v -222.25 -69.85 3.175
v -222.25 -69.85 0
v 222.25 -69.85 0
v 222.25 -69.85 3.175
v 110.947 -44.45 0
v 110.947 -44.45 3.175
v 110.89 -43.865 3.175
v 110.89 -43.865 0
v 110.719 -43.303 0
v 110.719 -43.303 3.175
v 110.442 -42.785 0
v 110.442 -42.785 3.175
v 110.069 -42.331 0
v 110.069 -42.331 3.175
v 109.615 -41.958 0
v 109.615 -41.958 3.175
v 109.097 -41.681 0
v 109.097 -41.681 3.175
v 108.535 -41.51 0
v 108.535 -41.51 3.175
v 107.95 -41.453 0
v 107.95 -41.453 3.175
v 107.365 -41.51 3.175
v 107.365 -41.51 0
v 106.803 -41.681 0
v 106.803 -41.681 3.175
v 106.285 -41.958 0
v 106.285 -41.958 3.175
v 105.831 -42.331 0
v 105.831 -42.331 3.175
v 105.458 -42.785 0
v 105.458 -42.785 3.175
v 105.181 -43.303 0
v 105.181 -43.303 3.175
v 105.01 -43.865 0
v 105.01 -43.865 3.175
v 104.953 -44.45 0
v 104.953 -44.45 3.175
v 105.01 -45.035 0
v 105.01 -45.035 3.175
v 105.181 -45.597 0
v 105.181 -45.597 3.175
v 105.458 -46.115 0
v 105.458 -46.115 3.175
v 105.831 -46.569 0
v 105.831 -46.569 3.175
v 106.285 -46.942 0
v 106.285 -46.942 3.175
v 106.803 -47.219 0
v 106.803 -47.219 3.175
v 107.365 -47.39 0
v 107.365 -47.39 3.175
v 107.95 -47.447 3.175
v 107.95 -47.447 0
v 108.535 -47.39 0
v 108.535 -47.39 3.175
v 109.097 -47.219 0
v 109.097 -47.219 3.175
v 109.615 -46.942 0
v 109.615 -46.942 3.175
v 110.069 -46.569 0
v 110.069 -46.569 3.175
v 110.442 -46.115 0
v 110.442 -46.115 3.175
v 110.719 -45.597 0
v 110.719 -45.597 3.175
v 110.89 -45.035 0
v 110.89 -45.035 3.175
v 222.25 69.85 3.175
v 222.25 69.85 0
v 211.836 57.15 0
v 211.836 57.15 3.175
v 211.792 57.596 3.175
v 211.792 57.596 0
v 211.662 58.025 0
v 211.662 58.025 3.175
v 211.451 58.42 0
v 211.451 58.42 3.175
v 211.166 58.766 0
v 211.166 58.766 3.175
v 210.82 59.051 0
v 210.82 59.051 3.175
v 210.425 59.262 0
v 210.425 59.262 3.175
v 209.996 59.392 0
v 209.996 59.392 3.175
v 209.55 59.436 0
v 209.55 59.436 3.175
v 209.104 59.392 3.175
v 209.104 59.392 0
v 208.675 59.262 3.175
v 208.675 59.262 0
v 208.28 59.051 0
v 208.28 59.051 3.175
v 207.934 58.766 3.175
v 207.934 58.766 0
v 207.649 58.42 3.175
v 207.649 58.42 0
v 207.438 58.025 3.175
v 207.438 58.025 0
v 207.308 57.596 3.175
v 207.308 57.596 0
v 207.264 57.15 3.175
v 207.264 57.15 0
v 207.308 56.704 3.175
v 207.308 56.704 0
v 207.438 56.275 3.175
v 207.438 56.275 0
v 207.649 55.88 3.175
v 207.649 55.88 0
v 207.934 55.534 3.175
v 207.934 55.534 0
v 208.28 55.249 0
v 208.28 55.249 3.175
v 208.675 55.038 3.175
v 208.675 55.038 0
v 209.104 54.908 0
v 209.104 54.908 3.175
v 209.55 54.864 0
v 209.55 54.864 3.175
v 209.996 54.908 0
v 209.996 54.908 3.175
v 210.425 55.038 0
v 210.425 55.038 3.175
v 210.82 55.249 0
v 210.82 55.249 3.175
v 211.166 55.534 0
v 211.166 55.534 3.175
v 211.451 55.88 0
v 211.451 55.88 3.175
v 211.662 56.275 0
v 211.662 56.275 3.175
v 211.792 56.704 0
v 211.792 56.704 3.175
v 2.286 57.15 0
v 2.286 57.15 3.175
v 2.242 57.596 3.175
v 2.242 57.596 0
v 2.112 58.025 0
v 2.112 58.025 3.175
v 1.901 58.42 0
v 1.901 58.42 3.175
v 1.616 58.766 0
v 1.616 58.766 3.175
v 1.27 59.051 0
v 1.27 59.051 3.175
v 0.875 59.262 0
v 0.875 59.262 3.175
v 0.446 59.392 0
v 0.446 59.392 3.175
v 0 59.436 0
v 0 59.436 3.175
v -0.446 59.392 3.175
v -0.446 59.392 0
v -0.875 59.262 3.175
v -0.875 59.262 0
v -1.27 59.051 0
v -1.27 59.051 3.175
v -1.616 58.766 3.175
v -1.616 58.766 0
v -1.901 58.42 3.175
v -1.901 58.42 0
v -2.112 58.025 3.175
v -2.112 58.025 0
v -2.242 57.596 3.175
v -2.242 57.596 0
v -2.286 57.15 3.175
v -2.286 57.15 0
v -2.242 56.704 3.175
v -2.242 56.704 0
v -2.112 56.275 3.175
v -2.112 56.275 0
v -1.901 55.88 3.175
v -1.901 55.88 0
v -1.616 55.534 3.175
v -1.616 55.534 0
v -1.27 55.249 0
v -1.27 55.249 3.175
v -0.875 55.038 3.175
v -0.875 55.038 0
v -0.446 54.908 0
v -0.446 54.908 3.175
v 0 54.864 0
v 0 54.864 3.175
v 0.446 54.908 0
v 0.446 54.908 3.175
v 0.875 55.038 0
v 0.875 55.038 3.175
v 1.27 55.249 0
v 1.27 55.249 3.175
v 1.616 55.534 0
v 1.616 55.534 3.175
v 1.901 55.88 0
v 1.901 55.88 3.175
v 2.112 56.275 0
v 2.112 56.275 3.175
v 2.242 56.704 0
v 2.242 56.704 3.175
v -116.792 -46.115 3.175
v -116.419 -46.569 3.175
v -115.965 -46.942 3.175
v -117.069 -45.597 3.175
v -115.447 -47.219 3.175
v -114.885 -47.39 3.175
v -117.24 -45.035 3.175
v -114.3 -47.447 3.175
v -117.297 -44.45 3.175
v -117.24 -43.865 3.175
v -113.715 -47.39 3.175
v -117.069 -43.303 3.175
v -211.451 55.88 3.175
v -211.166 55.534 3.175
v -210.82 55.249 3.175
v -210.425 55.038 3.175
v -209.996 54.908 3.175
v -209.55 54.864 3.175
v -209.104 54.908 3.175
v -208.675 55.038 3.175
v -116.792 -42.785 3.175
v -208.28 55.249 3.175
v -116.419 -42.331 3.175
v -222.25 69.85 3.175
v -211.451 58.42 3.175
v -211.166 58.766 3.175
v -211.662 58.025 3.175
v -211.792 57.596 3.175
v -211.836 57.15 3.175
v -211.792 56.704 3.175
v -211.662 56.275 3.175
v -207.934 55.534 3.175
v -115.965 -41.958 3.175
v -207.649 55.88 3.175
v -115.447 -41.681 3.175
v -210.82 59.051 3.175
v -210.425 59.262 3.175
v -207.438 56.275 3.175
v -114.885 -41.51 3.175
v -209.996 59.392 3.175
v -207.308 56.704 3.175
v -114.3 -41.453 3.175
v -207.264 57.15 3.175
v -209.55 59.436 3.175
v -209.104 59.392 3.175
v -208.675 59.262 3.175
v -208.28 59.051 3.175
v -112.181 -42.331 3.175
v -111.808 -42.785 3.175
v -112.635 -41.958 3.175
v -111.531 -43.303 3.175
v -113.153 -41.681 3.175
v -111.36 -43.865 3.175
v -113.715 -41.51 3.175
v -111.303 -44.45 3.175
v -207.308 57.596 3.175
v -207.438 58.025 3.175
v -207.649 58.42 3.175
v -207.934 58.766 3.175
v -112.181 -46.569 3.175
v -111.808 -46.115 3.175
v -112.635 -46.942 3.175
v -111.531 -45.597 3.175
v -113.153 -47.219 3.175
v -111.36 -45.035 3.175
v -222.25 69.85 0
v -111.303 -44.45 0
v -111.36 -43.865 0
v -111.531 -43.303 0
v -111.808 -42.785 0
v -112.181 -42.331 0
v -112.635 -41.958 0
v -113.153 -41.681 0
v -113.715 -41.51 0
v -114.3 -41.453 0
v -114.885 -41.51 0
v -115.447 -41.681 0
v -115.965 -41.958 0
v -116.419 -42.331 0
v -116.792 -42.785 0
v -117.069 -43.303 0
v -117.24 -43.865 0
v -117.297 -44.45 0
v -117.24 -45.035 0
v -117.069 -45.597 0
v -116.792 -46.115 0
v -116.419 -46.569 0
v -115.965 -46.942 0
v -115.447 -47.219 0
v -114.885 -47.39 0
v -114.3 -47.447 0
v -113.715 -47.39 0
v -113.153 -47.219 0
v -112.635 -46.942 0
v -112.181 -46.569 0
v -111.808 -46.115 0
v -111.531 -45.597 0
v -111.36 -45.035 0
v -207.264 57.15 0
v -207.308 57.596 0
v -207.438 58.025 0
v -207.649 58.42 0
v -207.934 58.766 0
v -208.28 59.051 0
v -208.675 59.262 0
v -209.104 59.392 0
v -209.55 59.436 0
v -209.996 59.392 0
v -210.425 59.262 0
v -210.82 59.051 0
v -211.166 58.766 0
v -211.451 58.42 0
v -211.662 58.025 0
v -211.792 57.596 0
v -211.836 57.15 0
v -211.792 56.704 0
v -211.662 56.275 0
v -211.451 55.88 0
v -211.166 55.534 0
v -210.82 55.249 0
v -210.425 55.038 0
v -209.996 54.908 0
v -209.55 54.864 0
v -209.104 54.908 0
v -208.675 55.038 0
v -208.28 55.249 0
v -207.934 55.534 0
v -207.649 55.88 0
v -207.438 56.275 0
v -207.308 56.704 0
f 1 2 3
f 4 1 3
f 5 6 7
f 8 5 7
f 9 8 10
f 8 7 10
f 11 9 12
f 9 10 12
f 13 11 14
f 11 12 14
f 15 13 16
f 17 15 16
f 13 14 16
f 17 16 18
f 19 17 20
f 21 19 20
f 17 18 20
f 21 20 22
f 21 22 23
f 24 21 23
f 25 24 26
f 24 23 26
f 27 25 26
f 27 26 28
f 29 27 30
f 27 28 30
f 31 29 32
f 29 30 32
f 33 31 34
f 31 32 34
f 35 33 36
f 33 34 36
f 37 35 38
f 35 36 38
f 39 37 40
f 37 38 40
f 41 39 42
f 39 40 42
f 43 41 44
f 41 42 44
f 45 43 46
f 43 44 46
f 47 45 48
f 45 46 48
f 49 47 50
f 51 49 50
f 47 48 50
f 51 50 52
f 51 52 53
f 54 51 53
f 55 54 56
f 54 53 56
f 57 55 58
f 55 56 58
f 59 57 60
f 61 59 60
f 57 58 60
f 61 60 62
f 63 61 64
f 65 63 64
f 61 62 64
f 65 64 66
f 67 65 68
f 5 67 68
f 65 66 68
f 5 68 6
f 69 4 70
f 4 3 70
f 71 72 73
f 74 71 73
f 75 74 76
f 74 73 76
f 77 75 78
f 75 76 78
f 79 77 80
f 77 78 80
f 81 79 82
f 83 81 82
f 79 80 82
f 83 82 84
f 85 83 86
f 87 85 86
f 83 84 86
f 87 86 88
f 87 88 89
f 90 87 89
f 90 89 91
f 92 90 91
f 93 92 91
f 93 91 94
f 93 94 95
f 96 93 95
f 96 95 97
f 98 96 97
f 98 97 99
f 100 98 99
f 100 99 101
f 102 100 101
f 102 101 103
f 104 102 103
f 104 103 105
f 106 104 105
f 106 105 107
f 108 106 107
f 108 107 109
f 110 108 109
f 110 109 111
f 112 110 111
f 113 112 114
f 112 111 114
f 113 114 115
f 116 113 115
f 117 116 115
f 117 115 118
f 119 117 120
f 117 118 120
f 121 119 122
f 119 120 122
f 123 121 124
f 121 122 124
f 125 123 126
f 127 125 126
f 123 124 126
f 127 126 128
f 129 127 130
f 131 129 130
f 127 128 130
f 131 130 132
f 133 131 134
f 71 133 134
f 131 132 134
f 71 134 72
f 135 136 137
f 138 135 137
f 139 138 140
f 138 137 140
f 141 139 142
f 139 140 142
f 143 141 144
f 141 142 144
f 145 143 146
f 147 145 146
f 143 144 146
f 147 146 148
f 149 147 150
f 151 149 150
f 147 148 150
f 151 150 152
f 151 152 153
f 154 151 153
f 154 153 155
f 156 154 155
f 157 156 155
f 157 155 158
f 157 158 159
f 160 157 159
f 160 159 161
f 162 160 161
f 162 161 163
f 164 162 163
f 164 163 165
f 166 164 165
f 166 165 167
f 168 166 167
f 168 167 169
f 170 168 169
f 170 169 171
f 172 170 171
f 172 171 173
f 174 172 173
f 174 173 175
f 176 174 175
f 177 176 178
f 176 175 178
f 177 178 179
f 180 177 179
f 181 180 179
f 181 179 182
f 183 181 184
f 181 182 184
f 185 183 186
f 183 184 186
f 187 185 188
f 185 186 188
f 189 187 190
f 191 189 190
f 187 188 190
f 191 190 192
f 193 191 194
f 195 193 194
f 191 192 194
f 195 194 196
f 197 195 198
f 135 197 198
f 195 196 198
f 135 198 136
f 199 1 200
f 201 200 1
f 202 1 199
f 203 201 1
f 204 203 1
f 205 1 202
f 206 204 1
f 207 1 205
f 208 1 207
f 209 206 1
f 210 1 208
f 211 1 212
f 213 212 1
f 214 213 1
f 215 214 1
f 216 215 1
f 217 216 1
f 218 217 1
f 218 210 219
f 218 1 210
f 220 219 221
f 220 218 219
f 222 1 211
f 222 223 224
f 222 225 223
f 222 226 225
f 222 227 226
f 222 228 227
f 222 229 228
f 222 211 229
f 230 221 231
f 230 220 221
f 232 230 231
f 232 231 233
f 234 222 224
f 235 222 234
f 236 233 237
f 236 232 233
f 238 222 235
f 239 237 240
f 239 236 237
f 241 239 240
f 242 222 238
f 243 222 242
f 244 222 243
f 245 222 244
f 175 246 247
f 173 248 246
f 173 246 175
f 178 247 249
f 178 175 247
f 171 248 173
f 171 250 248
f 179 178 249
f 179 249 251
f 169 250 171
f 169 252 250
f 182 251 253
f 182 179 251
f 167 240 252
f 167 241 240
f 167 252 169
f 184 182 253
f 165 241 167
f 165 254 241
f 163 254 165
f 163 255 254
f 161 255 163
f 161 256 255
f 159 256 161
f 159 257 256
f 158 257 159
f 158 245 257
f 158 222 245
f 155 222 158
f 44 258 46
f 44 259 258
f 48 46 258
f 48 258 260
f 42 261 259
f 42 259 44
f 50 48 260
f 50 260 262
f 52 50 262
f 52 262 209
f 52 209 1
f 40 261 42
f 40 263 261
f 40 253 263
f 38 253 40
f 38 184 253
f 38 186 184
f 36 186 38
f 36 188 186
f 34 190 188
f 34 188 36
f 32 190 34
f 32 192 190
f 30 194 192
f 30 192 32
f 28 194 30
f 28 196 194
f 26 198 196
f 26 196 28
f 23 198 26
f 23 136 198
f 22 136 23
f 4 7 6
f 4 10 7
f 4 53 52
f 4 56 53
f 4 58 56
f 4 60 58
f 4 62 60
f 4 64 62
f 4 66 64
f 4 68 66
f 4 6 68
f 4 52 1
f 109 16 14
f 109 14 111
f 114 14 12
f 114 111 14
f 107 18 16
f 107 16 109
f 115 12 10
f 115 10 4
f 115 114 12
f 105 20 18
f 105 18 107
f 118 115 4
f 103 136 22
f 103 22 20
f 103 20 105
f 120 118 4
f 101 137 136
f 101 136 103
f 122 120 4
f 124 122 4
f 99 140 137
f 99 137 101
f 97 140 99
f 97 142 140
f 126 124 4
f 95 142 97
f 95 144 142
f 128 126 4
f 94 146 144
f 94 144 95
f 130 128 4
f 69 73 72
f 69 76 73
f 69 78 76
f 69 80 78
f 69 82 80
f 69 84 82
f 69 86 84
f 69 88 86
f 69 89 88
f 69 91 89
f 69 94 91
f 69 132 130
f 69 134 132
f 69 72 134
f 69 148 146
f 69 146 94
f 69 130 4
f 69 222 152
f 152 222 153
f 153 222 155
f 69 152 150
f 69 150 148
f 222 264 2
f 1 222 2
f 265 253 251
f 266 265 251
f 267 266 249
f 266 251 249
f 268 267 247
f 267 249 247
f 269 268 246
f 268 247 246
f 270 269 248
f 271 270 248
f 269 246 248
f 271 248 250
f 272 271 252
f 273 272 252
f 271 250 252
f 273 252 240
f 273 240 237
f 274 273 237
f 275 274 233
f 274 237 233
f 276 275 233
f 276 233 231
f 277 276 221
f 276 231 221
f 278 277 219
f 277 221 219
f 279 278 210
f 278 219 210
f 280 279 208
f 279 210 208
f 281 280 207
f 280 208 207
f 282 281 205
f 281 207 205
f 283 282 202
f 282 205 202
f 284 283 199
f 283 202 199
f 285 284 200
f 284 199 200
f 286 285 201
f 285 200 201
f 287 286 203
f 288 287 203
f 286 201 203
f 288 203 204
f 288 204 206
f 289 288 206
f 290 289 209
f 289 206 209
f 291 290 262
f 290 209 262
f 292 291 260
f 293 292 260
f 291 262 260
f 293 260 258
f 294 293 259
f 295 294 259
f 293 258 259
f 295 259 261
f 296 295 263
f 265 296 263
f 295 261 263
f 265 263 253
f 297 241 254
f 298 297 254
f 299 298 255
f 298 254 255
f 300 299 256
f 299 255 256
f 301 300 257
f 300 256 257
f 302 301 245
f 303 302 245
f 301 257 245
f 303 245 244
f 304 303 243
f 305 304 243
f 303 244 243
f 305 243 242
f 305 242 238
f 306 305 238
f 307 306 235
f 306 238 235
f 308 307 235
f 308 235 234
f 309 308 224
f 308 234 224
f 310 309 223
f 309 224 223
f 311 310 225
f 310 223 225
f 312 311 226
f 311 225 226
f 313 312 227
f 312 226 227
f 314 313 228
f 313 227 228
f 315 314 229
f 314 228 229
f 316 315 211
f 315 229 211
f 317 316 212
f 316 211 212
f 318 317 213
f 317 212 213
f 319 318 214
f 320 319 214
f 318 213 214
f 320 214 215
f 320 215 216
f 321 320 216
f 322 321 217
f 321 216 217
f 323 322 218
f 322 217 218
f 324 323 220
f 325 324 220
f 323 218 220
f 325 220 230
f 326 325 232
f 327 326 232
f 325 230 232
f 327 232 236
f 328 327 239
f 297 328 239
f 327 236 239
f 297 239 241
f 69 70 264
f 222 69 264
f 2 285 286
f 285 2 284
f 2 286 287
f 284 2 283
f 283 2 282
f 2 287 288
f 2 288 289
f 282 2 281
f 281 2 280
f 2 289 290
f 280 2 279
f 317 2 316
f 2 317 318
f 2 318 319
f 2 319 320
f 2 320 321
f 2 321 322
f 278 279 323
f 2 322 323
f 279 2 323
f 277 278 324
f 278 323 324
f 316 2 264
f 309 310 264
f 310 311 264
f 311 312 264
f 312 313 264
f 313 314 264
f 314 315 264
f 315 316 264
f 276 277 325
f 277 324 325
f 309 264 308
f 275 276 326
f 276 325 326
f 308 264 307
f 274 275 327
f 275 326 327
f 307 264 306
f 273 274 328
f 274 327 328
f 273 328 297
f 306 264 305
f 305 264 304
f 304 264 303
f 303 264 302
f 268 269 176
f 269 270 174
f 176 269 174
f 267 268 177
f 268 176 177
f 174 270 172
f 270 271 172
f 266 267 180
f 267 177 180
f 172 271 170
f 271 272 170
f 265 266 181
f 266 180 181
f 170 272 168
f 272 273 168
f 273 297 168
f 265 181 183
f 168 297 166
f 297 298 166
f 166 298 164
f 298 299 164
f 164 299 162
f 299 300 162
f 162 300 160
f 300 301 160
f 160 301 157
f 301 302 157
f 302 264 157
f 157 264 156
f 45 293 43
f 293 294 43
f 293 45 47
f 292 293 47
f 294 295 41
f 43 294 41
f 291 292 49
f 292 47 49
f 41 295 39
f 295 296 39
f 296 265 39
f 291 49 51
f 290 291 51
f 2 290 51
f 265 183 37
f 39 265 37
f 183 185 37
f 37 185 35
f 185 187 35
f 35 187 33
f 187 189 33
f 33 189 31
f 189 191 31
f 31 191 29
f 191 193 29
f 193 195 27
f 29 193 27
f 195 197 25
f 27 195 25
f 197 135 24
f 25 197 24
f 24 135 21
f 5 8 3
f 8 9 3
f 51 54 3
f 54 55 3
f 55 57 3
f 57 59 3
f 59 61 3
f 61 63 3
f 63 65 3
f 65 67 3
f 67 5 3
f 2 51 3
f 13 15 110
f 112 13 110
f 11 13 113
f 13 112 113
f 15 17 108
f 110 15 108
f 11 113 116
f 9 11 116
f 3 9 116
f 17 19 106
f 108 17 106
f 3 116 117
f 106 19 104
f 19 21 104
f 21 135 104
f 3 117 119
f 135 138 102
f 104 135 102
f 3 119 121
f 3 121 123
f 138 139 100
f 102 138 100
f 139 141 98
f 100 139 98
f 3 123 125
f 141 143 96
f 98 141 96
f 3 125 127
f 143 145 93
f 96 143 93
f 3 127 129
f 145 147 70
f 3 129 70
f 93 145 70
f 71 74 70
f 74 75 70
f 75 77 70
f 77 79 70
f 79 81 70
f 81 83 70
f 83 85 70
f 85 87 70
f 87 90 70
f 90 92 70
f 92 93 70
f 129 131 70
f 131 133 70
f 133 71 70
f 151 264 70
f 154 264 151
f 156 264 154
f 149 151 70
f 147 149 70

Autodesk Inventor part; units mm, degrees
ref_plane "YZ Plane" through (0, 0, 0) normal (1, 0, 0) x (0, 1, 0)
ref_plane "XZ Plane" through (0, 0, 0) normal (0, 1, 0) x (-1, 0, 0)
ref_plane "XY Plane" through (0, 0, 0) normal (0, 0, 1) x (1, 0, 0)
sketch "Sketch1" plane through (0, 0, 0) normal (0, 0, 1) x (1, 0, 0)
  line L0 (-222.25, -69.85) -> (222.25, -69.85)
  line L1 (222.25, -69.85) -> (222.25, 69.85)
  line L2 (222.25, 69.85) -> (-222.25, 69.85)
  line L3 (-222.25, 69.85) -> (-222.25, -69.85)
  line L4 (-222.25, -69.85) -> (222.25, 69.85) construction
  line L5 (222.25, -69.85) -> (-222.25, 69.85) construction
  point P0 (0, 0)
  dimension "d0" = 444.5
  dimension "d1" = 139.7
extrude "Extrusion1" add sketch "Sketch1" along normal blind 3.175
sketch "Sketch2" plane through (0, 0, 3.175) normal (0, 0, 1) x (1, 0, 0)
  circle A0 centre (209.55, 57.15) radius 2.286
  line L0 (222.25, -69.85) -> (222.25, 69.85) projected
  line L1 (222.25, 69.85) -> (-222.25, 69.85) projected
  circle A1 centre (-209.55, 57.15) radius 2.286
  line L2 (-222.25, 69.85) -> (-222.25, -69.85) projected
  circle A2 centre (0, 57.15) radius 2.286
  point P0 (0, 0)
  dimension "d10" = 4.572
  dimension "d12" = 12.7
  dimension "d11" = 12.7
  dimension "d7" = 4.572
  dimension "d9" = 12.7
  dimension "d8" = 12.7
  dimension "d5" = 4.572
  dimension "d6" = 12.7
extrude "Extrusion2" cut sketch "Sketch2" against normal blind 3.175
sketch "Sketch3" plane through (0, 0, 3.175) normal (0, 0, 1) x (1, 0, 0)
  circle A0 centre (-114.3, -44.45) radius 2.9972
  circle A1 centre (107.95, -44.45) radius 2.9972
  line L0 (-222.25, 69.85) -> (-222.25, -69.85) projected
  line L1 (222.25, -69.85) -> (222.25, 69.85) projected
  line L2 (-222.25, -69.85) -> (222.25, -69.85) projected
  point P0 (0, 0)
  dimension "d16" = 5.9944
  dimension "d17" = 5.9944
  dimension "d18" = 107.95
  dimension "d19" = 114.3
  dimension "d20" = 25.4
  dimension "d23" = 25.4
extrude "Extrusion3" cut sketch "Sketch3" against normal blind 25.4
properties part number "Drive Side Inner Plate"
